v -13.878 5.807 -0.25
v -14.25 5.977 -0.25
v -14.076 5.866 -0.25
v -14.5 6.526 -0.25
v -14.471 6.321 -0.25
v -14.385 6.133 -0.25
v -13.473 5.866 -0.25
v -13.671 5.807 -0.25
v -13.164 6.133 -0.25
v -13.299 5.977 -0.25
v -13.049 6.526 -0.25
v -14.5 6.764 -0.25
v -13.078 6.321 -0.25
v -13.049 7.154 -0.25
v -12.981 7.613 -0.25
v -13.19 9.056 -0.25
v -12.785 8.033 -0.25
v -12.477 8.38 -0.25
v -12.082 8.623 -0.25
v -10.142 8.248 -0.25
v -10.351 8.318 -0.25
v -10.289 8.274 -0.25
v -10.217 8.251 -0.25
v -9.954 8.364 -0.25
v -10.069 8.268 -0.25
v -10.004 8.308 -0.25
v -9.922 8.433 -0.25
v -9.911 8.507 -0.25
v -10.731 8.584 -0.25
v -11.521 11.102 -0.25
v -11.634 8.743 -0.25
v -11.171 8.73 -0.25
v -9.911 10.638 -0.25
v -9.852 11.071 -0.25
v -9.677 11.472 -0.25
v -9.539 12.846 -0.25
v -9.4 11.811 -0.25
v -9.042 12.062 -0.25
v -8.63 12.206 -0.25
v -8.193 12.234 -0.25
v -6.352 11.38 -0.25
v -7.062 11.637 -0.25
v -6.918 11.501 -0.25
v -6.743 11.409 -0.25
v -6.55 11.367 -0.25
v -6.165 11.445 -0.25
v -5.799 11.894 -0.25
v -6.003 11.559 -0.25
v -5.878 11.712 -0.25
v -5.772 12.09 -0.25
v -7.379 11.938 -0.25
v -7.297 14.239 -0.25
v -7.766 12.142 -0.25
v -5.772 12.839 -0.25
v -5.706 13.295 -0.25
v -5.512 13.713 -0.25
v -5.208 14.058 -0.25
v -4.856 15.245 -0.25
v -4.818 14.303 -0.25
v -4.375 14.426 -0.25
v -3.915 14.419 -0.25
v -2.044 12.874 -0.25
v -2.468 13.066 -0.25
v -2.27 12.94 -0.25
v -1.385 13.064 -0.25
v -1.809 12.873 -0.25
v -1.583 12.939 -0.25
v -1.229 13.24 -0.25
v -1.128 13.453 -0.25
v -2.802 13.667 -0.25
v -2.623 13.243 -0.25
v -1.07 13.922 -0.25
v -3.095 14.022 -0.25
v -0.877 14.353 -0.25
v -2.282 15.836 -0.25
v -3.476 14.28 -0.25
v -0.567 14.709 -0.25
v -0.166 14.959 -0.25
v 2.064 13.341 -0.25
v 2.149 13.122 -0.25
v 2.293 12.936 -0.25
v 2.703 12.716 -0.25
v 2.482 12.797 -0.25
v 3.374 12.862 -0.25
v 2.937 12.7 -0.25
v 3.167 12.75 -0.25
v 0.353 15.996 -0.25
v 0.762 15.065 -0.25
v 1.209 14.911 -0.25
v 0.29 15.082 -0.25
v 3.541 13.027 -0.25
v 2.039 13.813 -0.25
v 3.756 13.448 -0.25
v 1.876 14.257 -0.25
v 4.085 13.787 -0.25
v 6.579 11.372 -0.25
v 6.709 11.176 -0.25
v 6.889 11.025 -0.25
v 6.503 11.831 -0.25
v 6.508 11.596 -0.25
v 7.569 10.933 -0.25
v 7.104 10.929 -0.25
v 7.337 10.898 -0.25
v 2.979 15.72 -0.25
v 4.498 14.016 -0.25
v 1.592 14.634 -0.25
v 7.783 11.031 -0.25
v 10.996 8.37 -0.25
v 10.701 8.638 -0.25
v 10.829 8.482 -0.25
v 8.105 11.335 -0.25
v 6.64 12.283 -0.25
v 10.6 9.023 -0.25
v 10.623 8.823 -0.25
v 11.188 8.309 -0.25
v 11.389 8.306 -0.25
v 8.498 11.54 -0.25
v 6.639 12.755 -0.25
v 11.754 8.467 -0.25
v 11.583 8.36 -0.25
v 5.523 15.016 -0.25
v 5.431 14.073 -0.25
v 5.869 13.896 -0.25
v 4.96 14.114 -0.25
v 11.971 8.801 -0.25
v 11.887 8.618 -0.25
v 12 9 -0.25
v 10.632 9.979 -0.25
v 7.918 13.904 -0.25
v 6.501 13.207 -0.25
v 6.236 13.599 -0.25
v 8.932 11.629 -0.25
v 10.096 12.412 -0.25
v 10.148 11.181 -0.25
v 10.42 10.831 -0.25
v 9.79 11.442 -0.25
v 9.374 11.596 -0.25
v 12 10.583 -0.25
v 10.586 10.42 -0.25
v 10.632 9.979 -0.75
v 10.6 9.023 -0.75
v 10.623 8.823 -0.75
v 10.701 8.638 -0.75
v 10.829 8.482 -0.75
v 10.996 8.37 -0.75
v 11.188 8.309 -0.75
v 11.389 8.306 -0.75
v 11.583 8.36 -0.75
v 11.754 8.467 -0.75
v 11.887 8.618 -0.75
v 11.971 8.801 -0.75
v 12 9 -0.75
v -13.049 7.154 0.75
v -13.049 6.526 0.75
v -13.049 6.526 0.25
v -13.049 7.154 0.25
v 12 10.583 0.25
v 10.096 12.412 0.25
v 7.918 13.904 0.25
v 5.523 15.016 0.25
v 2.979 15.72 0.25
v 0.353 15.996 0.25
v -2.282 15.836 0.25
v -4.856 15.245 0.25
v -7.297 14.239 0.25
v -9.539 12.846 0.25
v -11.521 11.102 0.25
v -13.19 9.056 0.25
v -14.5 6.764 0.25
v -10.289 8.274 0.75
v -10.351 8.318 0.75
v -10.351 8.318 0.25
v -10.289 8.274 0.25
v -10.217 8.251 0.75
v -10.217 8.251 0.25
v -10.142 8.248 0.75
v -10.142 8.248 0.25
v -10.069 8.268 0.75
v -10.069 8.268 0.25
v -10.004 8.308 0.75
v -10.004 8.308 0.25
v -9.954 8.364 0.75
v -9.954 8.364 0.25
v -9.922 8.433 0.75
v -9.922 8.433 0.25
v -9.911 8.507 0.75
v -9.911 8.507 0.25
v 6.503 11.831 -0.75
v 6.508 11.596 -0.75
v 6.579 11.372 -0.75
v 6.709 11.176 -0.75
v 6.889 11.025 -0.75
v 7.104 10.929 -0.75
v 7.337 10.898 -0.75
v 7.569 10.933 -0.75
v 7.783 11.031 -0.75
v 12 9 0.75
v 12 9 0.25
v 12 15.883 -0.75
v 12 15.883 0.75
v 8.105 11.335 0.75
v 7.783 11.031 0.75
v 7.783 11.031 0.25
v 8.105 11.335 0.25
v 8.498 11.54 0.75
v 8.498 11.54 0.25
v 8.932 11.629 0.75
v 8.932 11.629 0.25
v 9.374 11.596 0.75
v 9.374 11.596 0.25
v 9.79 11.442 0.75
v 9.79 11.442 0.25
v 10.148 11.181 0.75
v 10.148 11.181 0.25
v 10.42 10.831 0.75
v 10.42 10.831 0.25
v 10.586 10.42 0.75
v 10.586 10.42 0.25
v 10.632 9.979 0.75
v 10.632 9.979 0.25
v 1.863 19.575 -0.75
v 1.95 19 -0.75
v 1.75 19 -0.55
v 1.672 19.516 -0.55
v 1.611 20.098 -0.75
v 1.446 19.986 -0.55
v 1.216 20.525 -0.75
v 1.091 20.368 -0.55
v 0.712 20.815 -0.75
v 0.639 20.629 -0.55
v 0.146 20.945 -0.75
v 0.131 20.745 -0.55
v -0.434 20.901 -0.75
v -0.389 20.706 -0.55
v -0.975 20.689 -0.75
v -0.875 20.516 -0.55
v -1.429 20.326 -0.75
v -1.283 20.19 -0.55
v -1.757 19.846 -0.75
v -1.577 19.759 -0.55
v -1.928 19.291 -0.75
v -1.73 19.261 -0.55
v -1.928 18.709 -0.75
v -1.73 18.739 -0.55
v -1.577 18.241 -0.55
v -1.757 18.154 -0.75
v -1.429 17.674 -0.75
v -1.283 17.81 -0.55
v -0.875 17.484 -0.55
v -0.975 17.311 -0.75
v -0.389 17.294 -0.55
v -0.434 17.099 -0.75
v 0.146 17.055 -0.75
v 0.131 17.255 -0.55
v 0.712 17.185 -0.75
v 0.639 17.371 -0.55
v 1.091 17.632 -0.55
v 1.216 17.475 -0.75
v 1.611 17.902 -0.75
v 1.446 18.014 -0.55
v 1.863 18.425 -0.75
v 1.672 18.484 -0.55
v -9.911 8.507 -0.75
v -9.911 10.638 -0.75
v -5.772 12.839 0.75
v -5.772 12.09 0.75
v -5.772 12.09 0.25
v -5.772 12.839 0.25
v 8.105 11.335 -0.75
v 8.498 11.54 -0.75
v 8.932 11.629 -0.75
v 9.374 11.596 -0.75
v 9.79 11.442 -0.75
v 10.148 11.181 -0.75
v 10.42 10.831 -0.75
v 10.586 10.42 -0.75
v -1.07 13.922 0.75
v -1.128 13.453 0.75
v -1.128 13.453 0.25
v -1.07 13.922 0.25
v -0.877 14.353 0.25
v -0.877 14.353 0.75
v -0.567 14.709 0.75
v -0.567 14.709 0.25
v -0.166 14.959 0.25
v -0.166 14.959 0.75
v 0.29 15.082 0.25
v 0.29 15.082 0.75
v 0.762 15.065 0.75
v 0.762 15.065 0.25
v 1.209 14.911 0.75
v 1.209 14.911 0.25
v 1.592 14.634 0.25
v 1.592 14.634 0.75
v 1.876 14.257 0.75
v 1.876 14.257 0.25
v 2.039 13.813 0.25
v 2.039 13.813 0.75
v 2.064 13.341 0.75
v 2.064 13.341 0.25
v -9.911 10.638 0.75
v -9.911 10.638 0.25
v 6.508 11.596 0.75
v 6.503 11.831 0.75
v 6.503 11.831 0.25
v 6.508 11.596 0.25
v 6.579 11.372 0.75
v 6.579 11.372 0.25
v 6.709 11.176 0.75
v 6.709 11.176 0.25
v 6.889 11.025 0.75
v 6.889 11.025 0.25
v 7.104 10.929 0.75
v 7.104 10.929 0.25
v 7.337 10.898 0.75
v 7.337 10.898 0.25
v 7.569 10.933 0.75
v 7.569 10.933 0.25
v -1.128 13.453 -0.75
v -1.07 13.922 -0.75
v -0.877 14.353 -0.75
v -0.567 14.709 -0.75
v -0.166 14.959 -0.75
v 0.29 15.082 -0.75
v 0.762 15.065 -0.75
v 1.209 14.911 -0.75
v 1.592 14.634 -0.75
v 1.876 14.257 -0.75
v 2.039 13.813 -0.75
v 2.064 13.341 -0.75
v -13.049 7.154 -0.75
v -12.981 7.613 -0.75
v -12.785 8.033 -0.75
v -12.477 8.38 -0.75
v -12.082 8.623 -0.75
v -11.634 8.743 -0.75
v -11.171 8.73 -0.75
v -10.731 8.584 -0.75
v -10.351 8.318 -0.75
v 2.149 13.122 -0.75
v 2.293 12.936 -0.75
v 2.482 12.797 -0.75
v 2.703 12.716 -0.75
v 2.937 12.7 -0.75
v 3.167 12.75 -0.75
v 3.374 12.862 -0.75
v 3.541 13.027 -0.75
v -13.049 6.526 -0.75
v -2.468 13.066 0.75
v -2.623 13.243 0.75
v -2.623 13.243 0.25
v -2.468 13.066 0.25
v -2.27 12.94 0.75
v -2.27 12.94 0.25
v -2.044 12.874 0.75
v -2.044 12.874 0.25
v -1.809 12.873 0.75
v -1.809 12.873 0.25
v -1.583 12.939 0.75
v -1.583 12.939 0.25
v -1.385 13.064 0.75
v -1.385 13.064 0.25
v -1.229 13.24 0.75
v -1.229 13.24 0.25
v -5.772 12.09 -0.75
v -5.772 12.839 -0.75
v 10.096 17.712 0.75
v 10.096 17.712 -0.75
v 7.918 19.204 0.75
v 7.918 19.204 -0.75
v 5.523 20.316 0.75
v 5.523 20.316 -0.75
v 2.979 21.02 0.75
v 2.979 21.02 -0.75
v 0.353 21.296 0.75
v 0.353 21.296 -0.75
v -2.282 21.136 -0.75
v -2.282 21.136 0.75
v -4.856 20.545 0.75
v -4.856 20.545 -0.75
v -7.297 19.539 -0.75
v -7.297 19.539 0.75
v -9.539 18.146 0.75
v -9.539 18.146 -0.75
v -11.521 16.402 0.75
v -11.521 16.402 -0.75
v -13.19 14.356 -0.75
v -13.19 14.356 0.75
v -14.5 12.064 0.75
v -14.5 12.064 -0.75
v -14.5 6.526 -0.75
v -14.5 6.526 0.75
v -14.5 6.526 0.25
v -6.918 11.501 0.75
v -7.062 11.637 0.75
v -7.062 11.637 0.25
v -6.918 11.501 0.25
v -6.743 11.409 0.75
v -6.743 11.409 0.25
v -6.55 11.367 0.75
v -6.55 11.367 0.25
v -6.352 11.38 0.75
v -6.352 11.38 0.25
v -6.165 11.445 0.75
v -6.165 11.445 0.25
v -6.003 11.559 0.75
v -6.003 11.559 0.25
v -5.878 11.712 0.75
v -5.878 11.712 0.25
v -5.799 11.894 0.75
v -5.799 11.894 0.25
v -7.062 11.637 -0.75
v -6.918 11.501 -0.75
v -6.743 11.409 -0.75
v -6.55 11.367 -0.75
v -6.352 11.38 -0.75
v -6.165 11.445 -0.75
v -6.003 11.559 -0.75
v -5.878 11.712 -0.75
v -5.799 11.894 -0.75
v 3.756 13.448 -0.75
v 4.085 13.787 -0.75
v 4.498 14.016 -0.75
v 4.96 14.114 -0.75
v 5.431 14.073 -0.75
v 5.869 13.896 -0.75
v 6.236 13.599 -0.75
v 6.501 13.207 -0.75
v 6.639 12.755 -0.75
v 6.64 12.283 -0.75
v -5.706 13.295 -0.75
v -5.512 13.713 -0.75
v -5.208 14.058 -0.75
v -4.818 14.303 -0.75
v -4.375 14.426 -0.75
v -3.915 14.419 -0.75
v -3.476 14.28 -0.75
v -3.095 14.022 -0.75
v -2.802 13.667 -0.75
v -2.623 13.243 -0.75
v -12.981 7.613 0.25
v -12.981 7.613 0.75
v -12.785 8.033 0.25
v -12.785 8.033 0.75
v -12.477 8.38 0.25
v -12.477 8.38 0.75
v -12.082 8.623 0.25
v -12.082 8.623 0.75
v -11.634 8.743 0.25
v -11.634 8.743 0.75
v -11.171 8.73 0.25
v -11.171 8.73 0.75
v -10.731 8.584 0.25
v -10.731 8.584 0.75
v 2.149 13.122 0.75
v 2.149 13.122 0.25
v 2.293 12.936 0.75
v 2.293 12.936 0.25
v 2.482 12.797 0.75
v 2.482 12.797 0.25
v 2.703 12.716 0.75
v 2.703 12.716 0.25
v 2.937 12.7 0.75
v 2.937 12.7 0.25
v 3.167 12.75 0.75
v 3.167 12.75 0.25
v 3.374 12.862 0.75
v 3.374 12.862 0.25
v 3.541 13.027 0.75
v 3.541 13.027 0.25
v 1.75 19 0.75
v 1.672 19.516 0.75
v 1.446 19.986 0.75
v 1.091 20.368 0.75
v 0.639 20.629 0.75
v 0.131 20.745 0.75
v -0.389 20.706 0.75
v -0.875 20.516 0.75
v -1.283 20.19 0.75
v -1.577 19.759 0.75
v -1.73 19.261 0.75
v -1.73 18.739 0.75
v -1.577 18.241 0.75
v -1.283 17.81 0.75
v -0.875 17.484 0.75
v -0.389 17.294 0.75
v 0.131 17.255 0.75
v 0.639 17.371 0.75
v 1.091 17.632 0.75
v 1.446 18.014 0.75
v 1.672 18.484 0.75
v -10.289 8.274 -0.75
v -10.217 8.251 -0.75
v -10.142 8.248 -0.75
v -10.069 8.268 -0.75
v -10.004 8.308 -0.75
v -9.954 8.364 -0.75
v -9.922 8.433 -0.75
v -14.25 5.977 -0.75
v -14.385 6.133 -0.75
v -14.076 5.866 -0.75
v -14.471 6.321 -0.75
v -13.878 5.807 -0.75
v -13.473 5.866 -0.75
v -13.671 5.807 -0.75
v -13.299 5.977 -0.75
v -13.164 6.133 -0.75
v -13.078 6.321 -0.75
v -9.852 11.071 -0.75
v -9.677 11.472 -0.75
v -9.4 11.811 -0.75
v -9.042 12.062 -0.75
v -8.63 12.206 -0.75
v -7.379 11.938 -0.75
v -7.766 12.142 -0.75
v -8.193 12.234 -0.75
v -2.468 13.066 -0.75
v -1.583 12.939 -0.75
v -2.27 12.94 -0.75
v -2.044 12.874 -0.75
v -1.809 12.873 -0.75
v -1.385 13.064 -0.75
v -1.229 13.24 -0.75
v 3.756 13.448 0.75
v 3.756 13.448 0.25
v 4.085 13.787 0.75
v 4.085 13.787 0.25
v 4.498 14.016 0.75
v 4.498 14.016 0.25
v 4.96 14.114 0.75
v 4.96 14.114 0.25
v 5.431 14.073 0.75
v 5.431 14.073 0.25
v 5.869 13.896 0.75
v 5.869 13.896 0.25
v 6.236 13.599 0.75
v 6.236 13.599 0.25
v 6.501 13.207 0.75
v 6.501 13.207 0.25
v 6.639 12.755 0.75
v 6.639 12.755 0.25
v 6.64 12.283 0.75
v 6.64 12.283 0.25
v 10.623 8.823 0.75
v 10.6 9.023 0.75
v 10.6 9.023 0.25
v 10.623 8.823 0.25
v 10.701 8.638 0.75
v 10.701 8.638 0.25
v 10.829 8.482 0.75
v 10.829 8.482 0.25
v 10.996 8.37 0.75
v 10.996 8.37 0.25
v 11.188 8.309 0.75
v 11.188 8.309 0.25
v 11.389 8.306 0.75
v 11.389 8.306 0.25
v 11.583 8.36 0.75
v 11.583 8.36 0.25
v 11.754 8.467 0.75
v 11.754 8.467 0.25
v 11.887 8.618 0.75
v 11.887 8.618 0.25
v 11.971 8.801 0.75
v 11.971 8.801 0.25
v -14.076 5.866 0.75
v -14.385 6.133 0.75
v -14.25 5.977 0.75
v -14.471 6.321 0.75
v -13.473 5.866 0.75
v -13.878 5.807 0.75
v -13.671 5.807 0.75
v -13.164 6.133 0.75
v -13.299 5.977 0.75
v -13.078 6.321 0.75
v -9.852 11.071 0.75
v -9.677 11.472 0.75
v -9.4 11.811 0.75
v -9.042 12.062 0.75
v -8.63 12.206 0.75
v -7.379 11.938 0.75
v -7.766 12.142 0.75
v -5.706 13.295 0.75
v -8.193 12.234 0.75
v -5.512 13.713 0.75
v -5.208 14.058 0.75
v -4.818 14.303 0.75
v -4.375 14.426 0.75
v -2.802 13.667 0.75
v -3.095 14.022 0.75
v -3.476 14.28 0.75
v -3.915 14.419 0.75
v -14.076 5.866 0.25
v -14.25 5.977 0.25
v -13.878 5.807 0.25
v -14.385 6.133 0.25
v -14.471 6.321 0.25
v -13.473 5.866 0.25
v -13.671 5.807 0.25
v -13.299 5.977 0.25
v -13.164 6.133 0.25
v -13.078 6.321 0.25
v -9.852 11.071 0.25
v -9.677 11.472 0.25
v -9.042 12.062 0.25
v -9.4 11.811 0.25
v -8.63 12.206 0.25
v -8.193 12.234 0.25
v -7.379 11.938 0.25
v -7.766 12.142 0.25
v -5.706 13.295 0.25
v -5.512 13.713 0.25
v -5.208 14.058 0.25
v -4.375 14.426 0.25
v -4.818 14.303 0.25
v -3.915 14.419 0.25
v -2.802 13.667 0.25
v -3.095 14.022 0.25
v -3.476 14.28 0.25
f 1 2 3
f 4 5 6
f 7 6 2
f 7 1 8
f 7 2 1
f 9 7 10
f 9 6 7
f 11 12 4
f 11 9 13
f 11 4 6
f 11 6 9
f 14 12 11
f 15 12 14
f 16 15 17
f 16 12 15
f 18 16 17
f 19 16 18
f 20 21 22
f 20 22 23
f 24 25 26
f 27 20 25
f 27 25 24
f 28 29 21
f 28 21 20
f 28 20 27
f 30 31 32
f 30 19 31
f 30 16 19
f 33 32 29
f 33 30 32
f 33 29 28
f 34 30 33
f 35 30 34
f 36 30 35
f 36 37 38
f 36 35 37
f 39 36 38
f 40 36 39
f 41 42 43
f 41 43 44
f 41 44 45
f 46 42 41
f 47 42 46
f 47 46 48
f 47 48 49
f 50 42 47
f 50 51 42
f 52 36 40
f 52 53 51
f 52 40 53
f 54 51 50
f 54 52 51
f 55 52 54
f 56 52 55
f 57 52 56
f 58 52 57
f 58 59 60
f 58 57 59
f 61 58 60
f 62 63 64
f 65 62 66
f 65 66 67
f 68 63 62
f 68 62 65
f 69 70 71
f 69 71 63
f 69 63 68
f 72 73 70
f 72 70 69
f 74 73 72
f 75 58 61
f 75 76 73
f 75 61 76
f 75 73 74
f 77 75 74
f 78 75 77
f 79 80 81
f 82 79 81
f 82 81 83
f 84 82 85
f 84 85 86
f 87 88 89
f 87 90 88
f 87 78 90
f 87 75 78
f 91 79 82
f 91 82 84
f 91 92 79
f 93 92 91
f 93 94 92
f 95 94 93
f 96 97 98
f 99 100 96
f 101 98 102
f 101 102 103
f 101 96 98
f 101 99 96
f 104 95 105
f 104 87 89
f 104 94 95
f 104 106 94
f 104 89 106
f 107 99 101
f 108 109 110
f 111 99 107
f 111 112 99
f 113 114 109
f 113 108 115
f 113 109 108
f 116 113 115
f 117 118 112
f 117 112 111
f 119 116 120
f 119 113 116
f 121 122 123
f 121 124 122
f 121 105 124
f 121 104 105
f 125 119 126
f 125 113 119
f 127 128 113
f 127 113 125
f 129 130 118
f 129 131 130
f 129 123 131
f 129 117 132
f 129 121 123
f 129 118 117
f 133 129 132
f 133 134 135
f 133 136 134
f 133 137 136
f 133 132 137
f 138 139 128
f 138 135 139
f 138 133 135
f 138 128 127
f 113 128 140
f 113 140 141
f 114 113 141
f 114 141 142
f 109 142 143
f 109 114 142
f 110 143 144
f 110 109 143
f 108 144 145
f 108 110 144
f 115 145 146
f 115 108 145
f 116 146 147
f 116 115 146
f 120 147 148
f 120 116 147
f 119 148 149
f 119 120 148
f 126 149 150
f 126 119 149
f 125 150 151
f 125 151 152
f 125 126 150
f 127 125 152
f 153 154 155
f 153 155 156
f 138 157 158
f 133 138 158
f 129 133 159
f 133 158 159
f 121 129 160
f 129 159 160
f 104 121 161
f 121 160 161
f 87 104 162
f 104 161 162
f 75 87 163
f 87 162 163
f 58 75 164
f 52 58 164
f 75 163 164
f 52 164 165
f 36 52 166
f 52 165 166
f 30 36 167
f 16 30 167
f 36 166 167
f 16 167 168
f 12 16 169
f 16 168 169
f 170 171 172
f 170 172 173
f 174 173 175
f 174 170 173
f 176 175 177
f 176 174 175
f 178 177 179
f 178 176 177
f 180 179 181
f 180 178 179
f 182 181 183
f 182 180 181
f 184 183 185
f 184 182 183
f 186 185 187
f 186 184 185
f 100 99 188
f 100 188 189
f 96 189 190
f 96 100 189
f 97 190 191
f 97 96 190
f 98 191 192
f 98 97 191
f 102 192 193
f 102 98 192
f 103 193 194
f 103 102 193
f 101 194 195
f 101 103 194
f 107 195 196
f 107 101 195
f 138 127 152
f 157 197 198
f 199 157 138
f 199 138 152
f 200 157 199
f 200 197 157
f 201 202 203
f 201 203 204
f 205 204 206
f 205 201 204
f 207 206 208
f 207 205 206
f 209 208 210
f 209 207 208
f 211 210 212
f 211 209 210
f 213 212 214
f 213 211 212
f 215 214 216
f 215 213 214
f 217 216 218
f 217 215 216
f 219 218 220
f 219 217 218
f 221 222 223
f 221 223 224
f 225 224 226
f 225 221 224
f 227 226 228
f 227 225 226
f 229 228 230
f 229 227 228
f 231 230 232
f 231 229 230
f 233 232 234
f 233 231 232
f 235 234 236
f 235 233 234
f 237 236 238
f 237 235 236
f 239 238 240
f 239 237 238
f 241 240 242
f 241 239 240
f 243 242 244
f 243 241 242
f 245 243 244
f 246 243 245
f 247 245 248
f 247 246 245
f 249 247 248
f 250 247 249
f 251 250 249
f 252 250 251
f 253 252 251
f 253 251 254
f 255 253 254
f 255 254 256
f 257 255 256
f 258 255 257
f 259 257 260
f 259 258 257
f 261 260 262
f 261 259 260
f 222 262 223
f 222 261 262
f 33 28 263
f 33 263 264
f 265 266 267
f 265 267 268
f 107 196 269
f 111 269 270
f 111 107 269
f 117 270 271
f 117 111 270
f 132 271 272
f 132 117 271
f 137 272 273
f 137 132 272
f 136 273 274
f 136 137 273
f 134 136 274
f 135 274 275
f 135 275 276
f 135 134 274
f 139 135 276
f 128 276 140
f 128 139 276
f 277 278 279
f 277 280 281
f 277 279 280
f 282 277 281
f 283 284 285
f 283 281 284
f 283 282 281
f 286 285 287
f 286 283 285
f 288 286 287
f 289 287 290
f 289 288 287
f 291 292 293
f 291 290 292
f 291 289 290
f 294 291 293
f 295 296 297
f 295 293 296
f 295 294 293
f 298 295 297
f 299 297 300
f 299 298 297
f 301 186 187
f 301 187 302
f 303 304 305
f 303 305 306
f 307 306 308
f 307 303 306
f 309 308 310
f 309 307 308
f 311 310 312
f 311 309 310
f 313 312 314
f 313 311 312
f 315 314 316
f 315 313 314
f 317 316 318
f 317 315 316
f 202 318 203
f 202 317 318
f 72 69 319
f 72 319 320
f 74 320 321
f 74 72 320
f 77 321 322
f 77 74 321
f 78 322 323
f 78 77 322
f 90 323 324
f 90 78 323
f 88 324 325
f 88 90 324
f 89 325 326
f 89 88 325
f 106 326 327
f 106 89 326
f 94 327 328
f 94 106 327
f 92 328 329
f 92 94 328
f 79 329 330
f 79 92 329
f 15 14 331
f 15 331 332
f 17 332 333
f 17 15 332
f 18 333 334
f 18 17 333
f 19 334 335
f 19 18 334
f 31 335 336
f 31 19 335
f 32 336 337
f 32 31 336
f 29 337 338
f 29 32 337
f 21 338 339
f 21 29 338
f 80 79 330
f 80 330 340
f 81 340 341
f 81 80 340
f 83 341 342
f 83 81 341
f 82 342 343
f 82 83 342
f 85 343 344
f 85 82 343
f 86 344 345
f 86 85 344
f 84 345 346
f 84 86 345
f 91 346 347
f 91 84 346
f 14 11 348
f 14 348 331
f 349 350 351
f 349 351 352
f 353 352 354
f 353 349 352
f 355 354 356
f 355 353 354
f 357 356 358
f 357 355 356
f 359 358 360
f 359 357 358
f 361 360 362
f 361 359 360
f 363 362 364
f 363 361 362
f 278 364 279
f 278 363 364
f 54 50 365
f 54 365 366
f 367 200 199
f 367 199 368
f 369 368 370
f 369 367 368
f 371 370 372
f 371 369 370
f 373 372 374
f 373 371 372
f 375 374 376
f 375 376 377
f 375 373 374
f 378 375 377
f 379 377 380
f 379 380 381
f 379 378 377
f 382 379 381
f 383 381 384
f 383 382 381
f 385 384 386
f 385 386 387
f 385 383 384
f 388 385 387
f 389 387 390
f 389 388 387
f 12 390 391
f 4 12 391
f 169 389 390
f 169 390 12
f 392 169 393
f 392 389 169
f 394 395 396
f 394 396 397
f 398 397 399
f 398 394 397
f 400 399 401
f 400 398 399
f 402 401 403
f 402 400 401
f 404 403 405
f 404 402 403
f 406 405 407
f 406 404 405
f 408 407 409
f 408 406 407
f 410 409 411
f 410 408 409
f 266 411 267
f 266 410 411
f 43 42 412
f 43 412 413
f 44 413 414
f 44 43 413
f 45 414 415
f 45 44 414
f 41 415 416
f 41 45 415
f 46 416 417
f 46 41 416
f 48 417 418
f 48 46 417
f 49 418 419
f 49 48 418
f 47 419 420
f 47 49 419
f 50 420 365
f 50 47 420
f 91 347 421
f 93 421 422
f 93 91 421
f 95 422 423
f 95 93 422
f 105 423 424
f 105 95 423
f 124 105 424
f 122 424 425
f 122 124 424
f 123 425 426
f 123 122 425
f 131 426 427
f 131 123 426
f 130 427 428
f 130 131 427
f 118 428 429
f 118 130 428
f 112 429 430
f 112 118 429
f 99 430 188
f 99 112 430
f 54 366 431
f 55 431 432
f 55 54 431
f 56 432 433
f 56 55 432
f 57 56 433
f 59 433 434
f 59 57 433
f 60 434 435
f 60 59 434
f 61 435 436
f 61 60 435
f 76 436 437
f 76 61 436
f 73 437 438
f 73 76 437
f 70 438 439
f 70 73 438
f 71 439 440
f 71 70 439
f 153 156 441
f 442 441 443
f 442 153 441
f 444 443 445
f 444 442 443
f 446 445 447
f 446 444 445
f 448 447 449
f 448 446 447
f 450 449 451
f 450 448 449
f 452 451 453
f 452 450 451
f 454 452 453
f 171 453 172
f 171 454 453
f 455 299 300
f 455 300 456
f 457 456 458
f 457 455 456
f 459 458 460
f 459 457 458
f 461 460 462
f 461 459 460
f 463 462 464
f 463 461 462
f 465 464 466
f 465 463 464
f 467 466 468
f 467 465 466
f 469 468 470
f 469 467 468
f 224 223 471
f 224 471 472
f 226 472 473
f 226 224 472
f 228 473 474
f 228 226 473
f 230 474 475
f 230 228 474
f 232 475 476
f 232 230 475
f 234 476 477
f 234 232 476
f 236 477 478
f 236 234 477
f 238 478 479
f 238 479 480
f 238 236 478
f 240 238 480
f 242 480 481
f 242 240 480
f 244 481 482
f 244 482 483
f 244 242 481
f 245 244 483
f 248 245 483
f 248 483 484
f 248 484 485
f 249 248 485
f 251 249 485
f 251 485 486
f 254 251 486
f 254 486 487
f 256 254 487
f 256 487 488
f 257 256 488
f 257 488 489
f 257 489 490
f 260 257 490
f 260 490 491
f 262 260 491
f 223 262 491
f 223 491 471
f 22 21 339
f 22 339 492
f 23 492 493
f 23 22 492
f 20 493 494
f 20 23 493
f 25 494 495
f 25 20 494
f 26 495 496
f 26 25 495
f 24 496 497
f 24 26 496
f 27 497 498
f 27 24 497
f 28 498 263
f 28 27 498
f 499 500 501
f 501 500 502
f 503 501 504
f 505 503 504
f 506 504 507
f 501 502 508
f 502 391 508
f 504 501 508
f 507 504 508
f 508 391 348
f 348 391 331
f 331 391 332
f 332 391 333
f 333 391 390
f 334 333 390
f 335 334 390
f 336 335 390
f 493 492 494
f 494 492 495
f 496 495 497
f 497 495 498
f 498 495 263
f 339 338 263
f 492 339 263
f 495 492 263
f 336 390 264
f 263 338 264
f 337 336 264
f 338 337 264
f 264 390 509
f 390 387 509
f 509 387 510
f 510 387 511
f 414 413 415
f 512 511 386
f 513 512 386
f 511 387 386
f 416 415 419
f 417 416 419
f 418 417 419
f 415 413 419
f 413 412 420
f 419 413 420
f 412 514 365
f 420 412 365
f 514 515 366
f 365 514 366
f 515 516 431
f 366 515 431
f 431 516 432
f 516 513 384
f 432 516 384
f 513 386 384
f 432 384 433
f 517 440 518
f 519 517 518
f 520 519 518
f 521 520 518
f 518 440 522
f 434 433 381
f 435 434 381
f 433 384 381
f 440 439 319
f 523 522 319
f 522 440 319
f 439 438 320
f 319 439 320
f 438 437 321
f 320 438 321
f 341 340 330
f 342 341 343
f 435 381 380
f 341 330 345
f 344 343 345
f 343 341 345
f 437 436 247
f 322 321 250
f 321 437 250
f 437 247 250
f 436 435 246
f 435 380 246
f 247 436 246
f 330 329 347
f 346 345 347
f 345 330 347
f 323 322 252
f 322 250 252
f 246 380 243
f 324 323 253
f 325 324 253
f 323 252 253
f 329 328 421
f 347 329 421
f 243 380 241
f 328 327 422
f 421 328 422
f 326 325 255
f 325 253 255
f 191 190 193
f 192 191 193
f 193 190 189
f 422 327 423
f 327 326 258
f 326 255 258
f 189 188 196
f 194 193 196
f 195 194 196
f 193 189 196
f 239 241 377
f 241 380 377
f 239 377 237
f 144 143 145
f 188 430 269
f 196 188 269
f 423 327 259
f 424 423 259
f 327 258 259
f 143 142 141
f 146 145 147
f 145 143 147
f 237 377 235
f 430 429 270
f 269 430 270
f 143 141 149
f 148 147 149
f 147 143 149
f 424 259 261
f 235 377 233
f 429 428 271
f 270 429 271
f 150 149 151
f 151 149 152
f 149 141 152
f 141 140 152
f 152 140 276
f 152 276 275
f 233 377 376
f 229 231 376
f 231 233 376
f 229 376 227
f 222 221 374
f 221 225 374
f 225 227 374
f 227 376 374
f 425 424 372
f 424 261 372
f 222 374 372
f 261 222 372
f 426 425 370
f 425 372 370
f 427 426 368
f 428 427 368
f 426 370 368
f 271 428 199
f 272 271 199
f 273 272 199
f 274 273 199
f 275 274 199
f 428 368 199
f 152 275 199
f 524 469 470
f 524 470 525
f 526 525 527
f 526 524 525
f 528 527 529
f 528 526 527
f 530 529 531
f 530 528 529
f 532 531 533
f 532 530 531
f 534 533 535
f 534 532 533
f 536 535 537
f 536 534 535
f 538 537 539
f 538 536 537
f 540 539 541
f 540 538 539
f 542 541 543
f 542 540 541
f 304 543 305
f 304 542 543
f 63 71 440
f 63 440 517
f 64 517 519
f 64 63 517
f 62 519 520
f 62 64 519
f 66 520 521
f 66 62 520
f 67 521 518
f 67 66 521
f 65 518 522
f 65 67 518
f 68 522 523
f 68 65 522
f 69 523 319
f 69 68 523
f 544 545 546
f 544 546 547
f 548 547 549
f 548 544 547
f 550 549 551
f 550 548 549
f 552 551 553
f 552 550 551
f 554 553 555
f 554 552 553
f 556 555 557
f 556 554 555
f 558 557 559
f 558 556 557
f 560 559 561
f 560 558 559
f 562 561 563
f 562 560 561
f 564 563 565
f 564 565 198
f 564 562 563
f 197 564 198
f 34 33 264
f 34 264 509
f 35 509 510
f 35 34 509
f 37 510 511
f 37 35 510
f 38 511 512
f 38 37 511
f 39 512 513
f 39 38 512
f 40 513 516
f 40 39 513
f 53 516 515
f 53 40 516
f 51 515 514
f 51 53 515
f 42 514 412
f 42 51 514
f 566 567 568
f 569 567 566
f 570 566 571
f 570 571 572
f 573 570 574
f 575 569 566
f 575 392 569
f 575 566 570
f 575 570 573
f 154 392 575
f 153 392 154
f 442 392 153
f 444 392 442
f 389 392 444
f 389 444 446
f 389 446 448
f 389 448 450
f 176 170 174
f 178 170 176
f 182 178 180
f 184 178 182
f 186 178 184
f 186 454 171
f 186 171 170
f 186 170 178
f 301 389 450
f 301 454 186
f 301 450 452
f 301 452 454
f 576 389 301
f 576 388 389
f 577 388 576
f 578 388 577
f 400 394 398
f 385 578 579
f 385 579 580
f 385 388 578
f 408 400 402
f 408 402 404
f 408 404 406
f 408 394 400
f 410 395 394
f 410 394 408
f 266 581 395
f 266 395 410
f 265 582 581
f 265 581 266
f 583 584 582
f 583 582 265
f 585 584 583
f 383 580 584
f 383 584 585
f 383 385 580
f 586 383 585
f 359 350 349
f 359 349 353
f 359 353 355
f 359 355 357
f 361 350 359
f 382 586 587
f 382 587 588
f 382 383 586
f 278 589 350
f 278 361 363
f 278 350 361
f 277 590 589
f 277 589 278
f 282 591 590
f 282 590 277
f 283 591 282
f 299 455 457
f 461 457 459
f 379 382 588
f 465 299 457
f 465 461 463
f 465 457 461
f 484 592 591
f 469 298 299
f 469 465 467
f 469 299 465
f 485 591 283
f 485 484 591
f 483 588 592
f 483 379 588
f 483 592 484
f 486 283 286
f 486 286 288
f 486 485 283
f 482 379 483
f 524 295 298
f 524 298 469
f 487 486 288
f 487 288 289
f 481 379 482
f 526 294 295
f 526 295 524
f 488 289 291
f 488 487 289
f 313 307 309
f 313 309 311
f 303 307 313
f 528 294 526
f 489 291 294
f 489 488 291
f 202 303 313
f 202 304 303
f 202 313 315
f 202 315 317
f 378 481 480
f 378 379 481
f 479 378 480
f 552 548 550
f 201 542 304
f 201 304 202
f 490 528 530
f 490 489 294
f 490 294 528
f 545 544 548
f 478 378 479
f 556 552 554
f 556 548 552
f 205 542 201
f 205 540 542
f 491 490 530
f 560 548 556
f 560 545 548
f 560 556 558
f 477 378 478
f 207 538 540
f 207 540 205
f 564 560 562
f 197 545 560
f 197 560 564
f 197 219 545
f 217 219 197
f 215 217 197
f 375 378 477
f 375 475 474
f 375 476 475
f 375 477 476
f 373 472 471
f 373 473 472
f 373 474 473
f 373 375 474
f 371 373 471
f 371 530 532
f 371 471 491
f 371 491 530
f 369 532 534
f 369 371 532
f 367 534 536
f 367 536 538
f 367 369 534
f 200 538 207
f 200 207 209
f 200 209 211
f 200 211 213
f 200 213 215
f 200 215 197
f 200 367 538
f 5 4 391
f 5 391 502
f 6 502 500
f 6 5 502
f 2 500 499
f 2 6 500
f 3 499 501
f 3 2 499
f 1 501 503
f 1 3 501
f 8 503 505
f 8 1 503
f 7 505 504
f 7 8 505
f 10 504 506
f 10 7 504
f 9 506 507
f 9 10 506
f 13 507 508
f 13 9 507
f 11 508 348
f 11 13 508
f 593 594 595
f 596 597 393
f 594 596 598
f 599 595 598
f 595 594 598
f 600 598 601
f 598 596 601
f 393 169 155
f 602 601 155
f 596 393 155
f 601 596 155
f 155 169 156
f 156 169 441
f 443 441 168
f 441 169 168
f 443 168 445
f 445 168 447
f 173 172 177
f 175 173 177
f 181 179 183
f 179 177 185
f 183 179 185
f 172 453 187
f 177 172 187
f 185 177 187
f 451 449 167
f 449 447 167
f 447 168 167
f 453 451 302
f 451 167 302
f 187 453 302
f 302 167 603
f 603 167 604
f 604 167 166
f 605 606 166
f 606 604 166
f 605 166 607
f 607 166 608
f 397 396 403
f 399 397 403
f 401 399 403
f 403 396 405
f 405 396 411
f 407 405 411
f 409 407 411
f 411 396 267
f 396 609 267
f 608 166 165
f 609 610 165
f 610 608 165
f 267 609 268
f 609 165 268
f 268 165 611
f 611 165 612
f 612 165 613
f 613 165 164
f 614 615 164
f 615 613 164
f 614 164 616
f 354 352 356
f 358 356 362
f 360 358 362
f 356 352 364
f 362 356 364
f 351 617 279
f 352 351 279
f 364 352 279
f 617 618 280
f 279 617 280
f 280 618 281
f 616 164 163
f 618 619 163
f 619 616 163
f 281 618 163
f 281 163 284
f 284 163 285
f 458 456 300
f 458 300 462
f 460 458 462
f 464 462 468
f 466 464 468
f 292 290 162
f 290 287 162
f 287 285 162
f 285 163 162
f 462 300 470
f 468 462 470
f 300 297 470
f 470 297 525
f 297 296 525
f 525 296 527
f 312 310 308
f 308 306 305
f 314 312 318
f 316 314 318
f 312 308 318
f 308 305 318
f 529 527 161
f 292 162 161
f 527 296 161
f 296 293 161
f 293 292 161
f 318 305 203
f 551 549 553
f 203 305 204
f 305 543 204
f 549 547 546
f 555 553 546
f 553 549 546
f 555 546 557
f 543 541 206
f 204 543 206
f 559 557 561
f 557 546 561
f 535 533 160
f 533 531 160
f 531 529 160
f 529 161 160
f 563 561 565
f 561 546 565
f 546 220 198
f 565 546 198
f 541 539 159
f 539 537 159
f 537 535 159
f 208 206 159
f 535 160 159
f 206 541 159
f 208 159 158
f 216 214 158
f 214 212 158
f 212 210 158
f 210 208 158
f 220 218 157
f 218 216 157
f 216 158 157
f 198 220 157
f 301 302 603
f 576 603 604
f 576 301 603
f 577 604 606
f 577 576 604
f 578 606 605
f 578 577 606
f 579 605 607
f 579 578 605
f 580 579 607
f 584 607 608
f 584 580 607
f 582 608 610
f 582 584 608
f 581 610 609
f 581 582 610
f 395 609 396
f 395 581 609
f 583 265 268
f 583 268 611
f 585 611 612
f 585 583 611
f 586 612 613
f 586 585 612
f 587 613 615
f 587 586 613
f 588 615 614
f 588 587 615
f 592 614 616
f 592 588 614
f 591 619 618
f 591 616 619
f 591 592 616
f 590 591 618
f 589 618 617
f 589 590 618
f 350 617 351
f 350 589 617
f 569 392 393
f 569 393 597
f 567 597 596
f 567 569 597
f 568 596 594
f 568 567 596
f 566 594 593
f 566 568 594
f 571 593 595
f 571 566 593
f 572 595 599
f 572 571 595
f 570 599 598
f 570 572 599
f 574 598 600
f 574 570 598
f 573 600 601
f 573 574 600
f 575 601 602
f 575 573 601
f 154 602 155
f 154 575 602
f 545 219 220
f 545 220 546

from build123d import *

# Parameters (mm, degrees)
F0_R     = 1.75
F1_DEPTH = 0.75
F2_SIZE  = 0.2
F3_R     = 16
F4_DEPTH = 0.25


with BuildPart() as f1:
    # F0 (on Top) → F1 (new body, symmetric)
    with BuildSketch(Plane.XY):
        with BuildLine():
            ThreePointArc((-1.1283810214, 13.4527601729), (0.5269824002, 15.090801488), (2.0640494537, 13.3412780442))
            ThreePointArc((2.0640494537, 13.3412780442), (2.7028519806, 12.7159188095), (3.5407836432, 13.0273885024))
            ThreePointArc((3.5407836432, 13.0273885024), (5.6565595606, 14.000476204), (6.5025578694, 11.83075404))
            ThreePointArc((6.5025578694, 11.83075404), (6.888950435, 11.02462525), (7.7828775441, 11.0307215147))
            ThreePointArc((7.7828775441, 11.0307215147), (9.5873041905, 11.5334676573), (10.6323680347, 9.9789417592))
            Line((10.6323680347, 9.9789417592), (10.6003916286, 9.0234121058))
            ThreePointArc((10.6003916286, 9.0234121058), (11.2882923094, 8.300097914), (12, 9))
            Line((12, 9), (12, 15.8830052443))
            ThreePointArc((12, 15.8830052443), (-2.2823101594, 21.1363840676), (-14.5, 12.0638746292))
            Line((-14.5, 12.0638746292), (-14.5, 6.5256753509))
            ThreePointArc((-14.5, 6.5256753509), (-13.7743246491, 5.8), (-13.0486492981, 6.5256753509))
            Line((-13.0486492981, 6.5256753509), (-13.0486492981, 7.1539100671))
            ThreePointArc((-13.0486492981, 7.1539100671), (-12.082392441, 8.6230491446), (-10.3506872621, 8.3177310875))
            ThreePointArc((-10.3506872621, 8.3177310875), (-10.0687469644, 8.2680220118), (-9.9114299169, 8.5072137136))
            Line((-9.9114299169, 8.5072137136), (-9.9114299169, 10.6381451737))
            ThreePointArc((-9.9114299169, 10.6381451737), (-8.8408160288, 12.1480293893), (-7.0617419862, 11.6372848416))
            ThreePointArc((-7.0617419862, 11.6372848416), (-6.2563808661, 11.4060781626), (-5.7717294241, 12.0895809365))
            Line((-5.7717294241, 12.0895809365), (-5.7717294241, 12.83926297))
            ThreePointArc((-5.7717294241, 12.83926297), (-4.3750702496, 14.42628928), (-2.6234137882, 13.24264702))
            ThreePointArc((-2.6234137882, 13.24264702), (-1.8092503125, 12.8734848936), (-1.1283810214, 13.4527601729))
        make_face()
        with Locations((0, 19)):
            Circle(F0_R, mode=Mode.SUBTRACT)
    extrude(amount=F1_DEPTH, both=True)

    # F2
    f2_edges = [f1.edges().sort_by_distance(p)[0] for p in [
        (-1.75, 19, -0.75),
    ]]
    chamfer(f2_edges, length=F2_SIZE)

    # F3 (on Top) → F4 (cut, symmetric)
    with BuildSketch(Plane.XY):
        Circle(F3_R)
    extrude(amount=F4_DEPTH, both=True, mode=Mode.SUBTRACT)


solid = f1.part
